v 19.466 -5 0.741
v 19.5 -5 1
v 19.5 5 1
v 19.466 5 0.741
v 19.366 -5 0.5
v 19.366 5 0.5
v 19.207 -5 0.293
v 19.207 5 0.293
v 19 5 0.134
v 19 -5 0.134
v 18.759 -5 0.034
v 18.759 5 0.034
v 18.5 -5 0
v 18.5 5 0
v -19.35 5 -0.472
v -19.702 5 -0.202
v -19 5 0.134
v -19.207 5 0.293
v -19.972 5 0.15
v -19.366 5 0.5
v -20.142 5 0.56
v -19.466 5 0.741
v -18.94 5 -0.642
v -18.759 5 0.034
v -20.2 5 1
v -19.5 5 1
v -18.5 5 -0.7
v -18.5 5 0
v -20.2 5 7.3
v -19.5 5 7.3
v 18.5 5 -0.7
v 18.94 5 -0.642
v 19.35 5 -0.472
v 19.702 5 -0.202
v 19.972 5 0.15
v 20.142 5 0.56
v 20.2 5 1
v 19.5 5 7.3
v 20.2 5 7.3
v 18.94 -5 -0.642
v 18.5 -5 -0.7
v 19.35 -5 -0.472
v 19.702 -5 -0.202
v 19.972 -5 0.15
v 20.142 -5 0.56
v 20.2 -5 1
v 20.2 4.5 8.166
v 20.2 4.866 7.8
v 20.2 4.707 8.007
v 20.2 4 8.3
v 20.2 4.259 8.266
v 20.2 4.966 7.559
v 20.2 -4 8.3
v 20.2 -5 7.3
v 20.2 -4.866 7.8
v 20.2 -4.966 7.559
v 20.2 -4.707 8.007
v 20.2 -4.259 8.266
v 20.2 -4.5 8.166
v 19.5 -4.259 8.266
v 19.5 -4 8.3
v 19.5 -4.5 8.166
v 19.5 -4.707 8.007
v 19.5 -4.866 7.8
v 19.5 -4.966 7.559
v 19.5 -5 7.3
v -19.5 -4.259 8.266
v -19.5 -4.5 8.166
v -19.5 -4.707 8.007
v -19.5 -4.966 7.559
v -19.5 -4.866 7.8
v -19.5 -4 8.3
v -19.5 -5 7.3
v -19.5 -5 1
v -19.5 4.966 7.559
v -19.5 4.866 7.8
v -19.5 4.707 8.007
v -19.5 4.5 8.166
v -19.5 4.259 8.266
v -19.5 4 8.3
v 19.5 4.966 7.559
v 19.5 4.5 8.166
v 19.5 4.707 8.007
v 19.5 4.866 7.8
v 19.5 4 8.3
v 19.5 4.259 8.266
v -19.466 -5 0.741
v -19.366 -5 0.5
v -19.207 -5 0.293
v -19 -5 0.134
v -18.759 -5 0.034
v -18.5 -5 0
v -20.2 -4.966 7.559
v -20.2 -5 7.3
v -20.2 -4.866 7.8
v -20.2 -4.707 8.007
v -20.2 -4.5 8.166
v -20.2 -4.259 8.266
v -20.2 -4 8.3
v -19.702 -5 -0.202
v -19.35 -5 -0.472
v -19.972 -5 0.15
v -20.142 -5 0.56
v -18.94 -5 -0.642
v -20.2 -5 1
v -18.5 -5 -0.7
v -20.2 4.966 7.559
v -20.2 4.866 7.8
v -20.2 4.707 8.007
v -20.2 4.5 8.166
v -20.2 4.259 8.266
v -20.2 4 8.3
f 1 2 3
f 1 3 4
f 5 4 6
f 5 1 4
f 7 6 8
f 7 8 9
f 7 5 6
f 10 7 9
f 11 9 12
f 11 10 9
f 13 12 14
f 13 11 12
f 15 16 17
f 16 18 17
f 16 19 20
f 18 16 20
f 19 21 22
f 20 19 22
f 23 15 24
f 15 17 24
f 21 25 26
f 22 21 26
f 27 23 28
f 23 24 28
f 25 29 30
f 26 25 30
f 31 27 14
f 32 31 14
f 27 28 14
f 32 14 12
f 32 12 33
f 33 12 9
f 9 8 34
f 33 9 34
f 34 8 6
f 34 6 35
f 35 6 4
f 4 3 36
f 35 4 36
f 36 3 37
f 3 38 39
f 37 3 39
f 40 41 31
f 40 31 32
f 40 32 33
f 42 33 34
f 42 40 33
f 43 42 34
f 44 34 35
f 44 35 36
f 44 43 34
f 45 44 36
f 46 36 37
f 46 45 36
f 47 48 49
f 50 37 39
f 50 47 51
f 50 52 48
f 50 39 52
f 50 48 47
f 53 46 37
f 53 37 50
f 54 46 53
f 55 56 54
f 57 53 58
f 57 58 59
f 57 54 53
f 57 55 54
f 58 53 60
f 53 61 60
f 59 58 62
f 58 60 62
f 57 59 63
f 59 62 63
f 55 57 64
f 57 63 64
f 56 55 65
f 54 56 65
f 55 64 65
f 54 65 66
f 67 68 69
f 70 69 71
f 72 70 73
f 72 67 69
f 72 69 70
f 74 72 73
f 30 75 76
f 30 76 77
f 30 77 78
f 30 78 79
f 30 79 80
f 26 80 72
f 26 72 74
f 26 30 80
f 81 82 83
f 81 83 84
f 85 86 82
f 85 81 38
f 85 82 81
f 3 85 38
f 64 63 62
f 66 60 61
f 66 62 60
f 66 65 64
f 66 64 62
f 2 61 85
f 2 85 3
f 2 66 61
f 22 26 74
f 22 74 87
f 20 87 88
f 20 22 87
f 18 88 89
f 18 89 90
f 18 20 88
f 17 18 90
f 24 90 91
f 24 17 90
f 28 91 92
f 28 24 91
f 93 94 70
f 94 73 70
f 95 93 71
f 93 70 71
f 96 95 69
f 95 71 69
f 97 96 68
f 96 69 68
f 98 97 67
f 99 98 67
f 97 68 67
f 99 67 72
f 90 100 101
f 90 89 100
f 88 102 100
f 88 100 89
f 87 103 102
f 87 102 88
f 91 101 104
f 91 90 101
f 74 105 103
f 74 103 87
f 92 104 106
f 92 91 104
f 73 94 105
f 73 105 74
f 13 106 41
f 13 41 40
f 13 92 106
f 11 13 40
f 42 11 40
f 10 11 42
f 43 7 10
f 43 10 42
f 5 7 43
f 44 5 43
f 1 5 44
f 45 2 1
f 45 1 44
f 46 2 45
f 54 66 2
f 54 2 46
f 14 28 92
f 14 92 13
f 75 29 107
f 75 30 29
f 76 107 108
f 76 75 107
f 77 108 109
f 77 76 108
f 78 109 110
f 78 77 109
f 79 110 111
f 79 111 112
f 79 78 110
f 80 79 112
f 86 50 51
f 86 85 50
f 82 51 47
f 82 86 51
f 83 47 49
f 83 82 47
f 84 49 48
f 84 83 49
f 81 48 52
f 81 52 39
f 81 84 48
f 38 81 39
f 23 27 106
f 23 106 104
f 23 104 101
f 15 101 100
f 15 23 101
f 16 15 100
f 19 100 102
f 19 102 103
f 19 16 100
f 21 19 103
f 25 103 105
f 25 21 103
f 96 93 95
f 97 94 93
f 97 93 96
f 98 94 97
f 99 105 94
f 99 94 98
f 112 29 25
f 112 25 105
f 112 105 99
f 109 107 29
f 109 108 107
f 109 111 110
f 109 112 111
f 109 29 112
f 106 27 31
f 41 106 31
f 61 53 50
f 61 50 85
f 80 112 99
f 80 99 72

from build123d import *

# Parameters (mm, degrees)
SKETCH2_W                    = 39
SKETCH2_H                    = 10
BASE_FLANGE1_DEPTH           = 0.7
EDGE_FLANGE1_STRIP_W         = 4.8
EDGE_FLANGE1_STRIP_H         = 0.7
EDGE_FLANGE1_STRIP_CUT_DEPTH = 10
EDGE_FLANGE1_DEPTH           = 10
EDGE_FLANGE2_STRIP_W         = 4.8
EDGE_FLANGE2_STRIP_H         = 0.7
EDGE_FLANGE2_STRIP_CUT_DEPTH = 10
EDGE_FLANGE2_DEPTH           = 10
FILLET1_R                    = 1


# Sheet-metal steps are written as plain solids
with BuildPart() as part:
    # Sketch2 → Base-Flange1 (new body)
    with BuildSketch(Plane.XY):
        Rectangle(SKETCH2_W, SKETCH2_H)
    extrude(amount=-BASE_FLANGE1_DEPTH)

    # Edge-Flange1 strip (across the edge) → Edge-Flange1 strip cut (cut)
    with BuildSketch(Plane(origin=(-19.5, 5, 0), x_dir=(1, 0, 0), z_dir=(0, -1, 0))):
        with Locations((-1.4, -0.35)):
            Rectangle(EDGE_FLANGE1_STRIP_W, EDGE_FLANGE1_STRIP_H)
    extrude(amount=EDGE_FLANGE1_STRIP_CUT_DEPTH, mode=Mode.SUBTRACT)

    # Edge-Flange1 section (across the edge) → Edge-Flange1 (add)
    with BuildSketch(Plane(origin=(-19.5, 5, 0), x_dir=(1, 0, 0), z_dir=(0, -1, 0))):
        with BuildLine():
            Line((-0.7, 1), (-0.7, 8.3))
            Line((-0.7, 8.3), (0, 8.3))
            Line((0, 8.3), (0, 1))
            ThreePointArc((0, 1), (0.292893219, 0.292893219), (1, 0))
            Line((1, 0), (1, -0.7))
            ThreePointArc((1, -0.7), (-0.202081528, -0.202081528), (-0.7, 1))
        make_face()
    extrude(amount=EDGE_FLANGE1_DEPTH)

    # Edge-Flange2 strip (across the edge) → Edge-Flange2 strip cut (cut)
    with BuildSketch(Plane(origin=(19.5, -5, 0), x_dir=(-1, 0, 0), z_dir=(0, 1, 0))):
        with Locations((-1.4, -0.35)):
            Rectangle(EDGE_FLANGE2_STRIP_W, EDGE_FLANGE2_STRIP_H)
    extrude(amount=EDGE_FLANGE2_STRIP_CUT_DEPTH, mode=Mode.SUBTRACT)

    # Edge-Flange2 section (across the edge) → Edge-Flange2 (add)
    with BuildSketch(Plane(origin=(19.5, -5, 0), x_dir=(-1, 0, 0), z_dir=(0, 1, 0))):
        with BuildLine():
            Line((-0.7, 1), (-0.7, 8.3))
            Line((-0.7, 8.3), (0, 8.3))
            Line((0, 8.3), (0, 1))
            ThreePointArc((0, 1), (0.292893219, 0.292893219), (1, 0))
            Line((1, 0), (1, -0.7))
            ThreePointArc((1, -0.7), (-0.202081528, -0.202081528), (-0.7, 1))
        make_face()
    extrude(amount=EDGE_FLANGE2_DEPTH)

    # Fillet1
    fillet1_edges = [part.edges().sort_by_distance(p)[0] for p in [
        (-19.85, 5, 8.3),
        (-19.85, -5, 8.3),
        (19.85, -5, 8.3),
        (19.85, 5, 8.3),
    ]]
    fillet(fillet1_edges, radius=FILLET1_R)


solid = part.part
